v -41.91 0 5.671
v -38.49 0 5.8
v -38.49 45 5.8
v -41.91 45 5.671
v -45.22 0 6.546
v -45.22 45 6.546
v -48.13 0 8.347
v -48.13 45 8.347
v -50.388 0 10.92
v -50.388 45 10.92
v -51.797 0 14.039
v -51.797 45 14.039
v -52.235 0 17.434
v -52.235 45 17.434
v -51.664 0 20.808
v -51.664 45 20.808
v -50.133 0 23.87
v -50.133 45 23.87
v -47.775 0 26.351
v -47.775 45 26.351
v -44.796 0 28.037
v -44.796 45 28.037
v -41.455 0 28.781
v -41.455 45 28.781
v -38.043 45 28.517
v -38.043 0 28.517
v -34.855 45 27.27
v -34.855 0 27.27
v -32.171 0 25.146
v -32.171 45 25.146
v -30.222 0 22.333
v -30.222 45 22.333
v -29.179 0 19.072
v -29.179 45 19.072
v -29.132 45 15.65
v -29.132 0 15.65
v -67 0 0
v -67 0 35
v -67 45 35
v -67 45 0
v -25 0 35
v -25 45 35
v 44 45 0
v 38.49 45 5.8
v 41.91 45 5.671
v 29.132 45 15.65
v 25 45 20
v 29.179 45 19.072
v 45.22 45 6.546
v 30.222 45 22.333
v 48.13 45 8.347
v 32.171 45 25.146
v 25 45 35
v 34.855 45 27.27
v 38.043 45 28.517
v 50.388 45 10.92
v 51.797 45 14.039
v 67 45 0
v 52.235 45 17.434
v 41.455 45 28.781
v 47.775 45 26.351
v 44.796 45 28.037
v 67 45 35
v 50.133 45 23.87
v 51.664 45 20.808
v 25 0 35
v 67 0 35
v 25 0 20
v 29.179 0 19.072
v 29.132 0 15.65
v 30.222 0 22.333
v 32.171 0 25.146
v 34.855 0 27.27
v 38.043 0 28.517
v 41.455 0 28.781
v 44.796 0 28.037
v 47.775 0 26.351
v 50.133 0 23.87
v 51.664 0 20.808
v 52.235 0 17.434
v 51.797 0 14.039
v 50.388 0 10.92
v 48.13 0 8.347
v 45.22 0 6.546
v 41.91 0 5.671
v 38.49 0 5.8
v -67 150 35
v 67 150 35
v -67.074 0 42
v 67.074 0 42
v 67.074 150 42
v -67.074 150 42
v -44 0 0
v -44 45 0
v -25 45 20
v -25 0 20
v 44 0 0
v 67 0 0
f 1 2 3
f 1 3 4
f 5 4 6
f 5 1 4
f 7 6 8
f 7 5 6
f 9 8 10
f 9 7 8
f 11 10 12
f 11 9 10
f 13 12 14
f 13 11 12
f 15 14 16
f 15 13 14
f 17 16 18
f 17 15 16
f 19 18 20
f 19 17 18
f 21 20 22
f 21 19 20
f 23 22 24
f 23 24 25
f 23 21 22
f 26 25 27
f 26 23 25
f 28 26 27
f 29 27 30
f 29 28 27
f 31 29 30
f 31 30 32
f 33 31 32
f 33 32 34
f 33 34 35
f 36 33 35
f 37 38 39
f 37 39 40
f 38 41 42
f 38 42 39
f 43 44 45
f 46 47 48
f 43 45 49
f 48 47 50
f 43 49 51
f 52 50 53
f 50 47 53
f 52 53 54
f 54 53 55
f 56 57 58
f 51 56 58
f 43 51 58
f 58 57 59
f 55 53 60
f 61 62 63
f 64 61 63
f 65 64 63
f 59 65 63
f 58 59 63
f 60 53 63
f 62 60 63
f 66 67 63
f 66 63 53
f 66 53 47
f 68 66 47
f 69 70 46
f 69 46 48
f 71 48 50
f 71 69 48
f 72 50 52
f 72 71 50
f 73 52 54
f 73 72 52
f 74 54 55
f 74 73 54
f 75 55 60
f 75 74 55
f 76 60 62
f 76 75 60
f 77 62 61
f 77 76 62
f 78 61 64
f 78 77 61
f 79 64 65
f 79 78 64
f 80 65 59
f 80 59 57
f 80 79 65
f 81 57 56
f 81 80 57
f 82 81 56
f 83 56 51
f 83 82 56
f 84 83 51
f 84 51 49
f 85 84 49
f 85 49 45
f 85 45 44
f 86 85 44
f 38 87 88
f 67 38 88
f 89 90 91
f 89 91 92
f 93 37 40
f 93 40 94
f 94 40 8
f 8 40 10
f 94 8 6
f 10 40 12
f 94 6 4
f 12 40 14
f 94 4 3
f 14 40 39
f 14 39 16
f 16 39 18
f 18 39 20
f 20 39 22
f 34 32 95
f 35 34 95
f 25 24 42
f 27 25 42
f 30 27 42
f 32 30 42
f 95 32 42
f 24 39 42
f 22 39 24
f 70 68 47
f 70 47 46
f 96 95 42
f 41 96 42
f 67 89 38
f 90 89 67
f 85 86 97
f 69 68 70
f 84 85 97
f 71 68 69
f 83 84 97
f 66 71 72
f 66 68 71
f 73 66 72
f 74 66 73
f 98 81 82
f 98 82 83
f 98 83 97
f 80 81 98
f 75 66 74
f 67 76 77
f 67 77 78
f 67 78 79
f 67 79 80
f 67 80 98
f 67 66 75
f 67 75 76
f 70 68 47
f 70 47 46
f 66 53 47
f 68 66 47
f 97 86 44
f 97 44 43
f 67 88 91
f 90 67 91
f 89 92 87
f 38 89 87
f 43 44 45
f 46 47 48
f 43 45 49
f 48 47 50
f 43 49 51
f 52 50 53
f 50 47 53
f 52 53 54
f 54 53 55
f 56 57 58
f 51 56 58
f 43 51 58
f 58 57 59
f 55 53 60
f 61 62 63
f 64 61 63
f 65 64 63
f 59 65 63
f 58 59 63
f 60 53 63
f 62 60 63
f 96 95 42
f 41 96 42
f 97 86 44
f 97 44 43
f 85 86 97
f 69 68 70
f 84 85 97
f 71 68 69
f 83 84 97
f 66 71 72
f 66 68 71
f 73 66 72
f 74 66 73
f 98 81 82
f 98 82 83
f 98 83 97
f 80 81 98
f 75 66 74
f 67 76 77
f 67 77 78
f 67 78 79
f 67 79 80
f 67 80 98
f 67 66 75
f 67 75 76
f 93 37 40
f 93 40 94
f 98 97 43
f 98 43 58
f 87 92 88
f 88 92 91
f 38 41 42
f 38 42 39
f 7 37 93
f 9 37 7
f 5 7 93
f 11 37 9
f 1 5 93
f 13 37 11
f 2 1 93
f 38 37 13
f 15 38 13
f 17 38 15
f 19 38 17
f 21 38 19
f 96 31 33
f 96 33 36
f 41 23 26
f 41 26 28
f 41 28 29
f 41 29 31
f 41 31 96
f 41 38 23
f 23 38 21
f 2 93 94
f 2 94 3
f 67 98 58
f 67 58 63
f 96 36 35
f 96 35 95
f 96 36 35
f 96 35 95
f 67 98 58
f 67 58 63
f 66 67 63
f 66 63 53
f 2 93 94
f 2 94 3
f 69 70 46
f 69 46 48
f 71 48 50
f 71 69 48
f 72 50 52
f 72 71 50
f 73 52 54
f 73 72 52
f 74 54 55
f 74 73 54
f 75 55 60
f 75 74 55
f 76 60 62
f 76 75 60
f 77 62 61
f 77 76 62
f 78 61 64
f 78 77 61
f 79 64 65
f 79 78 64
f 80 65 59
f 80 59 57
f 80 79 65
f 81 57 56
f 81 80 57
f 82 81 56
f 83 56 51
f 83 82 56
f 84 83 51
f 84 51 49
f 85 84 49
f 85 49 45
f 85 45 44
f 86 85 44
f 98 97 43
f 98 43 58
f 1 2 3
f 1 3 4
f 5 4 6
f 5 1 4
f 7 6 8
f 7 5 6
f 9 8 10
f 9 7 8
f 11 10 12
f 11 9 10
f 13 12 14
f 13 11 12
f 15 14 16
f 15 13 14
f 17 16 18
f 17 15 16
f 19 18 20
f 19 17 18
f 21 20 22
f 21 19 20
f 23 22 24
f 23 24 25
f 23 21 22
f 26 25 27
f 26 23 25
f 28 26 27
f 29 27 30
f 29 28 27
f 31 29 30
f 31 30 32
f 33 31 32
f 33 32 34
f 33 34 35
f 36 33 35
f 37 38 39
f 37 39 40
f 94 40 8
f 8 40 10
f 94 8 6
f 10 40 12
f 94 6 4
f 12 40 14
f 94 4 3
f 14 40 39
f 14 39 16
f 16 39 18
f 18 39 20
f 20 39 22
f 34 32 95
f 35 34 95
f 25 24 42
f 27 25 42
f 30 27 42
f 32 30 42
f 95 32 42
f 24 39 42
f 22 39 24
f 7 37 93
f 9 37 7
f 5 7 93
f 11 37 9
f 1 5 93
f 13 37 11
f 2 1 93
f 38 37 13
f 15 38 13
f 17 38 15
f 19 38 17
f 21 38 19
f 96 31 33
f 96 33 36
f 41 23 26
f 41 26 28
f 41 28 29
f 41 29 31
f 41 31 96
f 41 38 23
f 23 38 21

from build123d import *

# Parameters (mm, degrees)
F1_DEPTH = 45
F2_DEPTH = 150
F3_DEPTH = 45


with BuildPart() as f1:
    # F0 (on Front) → F1 (new body)
    with BuildSketch(Plane.XZ):
        with BuildLine():
            Line((-25, 20), (-25, 35))
            Line((-25, 35), (-67, 35))
            Line((-67, 35), (-67, 0))
            Line((-67, 0), (-44, 0))
            Line((-44, 0), (-38.490004, 5.799995))
            ThreePointArc((-38.490004, 5.799995), (-49.045883, 25.1979), (-29.132497, 15.650003))
            Line((-29.132497, 15.650003), (-25, 20))
        make_face()
        with BuildLine():
            Line((67, 35), (25, 35))
            Line((25, 35), (25, 20))
            Line((25, 20), (29.132497, 15.650003))
            ThreePointArc((29.132497, 15.650003), (49.045883, 25.1979), (38.490004, 5.799995))
            Line((38.490004, 5.799995), (44, 0))
            Line((44, 0), (67, 0))
            Line((67, 0), (67, 35))
        make_face()
    extrude(amount=-F1_DEPTH)


with BuildPart() as f2:
    # F0 (on Front) → F2 (new body)
    with BuildSketch(Plane.XZ):
        Polygon((0, 41.99961), (0, 35), (25, 35), (67, 35), (67.073896, 41.99961), align=None)
        Polygon((-25, 35), (0, 35), (0, 41.99961), (-67.073896, 41.99961), (-67, 35), align=None)
    extrude(amount=-F2_DEPTH)


with BuildPart() as f3:
    # F0 (on Front) → F3 (new body)
    with BuildSketch(Plane.XZ):
        with BuildLine():
            Line((-25, 20), (-25, 35))
            Line((-25, 35), (-67, 35))
            Line((-67, 35), (-67, 0))
            Line((-67, 0), (-44, 0))
            Line((-44, 0), (-38.490004, 5.799995))
            ThreePointArc((-38.490004, 5.799995), (-49.045883, 25.1979), (-29.132497, 15.650003))
            Line((-29.132497, 15.650003), (-25, 20))
        make_face()
        with BuildLine():
            Line((67, 35), (25, 35))
            Line((25, 35), (25, 20))
            Line((25, 20), (29.132497, 15.650003))
            ThreePointArc((29.132497, 15.650003), (49.045883, 25.1979), (38.490004, 5.799995))
            Line((38.490004, 5.799995), (44, 0))
            Line((44, 0), (67, 0))
            Line((67, 0), (67, 35))
        make_face()
    extrude(amount=-F3_DEPTH)


solid = Compound([f1.part, f2.part, f3.part])
